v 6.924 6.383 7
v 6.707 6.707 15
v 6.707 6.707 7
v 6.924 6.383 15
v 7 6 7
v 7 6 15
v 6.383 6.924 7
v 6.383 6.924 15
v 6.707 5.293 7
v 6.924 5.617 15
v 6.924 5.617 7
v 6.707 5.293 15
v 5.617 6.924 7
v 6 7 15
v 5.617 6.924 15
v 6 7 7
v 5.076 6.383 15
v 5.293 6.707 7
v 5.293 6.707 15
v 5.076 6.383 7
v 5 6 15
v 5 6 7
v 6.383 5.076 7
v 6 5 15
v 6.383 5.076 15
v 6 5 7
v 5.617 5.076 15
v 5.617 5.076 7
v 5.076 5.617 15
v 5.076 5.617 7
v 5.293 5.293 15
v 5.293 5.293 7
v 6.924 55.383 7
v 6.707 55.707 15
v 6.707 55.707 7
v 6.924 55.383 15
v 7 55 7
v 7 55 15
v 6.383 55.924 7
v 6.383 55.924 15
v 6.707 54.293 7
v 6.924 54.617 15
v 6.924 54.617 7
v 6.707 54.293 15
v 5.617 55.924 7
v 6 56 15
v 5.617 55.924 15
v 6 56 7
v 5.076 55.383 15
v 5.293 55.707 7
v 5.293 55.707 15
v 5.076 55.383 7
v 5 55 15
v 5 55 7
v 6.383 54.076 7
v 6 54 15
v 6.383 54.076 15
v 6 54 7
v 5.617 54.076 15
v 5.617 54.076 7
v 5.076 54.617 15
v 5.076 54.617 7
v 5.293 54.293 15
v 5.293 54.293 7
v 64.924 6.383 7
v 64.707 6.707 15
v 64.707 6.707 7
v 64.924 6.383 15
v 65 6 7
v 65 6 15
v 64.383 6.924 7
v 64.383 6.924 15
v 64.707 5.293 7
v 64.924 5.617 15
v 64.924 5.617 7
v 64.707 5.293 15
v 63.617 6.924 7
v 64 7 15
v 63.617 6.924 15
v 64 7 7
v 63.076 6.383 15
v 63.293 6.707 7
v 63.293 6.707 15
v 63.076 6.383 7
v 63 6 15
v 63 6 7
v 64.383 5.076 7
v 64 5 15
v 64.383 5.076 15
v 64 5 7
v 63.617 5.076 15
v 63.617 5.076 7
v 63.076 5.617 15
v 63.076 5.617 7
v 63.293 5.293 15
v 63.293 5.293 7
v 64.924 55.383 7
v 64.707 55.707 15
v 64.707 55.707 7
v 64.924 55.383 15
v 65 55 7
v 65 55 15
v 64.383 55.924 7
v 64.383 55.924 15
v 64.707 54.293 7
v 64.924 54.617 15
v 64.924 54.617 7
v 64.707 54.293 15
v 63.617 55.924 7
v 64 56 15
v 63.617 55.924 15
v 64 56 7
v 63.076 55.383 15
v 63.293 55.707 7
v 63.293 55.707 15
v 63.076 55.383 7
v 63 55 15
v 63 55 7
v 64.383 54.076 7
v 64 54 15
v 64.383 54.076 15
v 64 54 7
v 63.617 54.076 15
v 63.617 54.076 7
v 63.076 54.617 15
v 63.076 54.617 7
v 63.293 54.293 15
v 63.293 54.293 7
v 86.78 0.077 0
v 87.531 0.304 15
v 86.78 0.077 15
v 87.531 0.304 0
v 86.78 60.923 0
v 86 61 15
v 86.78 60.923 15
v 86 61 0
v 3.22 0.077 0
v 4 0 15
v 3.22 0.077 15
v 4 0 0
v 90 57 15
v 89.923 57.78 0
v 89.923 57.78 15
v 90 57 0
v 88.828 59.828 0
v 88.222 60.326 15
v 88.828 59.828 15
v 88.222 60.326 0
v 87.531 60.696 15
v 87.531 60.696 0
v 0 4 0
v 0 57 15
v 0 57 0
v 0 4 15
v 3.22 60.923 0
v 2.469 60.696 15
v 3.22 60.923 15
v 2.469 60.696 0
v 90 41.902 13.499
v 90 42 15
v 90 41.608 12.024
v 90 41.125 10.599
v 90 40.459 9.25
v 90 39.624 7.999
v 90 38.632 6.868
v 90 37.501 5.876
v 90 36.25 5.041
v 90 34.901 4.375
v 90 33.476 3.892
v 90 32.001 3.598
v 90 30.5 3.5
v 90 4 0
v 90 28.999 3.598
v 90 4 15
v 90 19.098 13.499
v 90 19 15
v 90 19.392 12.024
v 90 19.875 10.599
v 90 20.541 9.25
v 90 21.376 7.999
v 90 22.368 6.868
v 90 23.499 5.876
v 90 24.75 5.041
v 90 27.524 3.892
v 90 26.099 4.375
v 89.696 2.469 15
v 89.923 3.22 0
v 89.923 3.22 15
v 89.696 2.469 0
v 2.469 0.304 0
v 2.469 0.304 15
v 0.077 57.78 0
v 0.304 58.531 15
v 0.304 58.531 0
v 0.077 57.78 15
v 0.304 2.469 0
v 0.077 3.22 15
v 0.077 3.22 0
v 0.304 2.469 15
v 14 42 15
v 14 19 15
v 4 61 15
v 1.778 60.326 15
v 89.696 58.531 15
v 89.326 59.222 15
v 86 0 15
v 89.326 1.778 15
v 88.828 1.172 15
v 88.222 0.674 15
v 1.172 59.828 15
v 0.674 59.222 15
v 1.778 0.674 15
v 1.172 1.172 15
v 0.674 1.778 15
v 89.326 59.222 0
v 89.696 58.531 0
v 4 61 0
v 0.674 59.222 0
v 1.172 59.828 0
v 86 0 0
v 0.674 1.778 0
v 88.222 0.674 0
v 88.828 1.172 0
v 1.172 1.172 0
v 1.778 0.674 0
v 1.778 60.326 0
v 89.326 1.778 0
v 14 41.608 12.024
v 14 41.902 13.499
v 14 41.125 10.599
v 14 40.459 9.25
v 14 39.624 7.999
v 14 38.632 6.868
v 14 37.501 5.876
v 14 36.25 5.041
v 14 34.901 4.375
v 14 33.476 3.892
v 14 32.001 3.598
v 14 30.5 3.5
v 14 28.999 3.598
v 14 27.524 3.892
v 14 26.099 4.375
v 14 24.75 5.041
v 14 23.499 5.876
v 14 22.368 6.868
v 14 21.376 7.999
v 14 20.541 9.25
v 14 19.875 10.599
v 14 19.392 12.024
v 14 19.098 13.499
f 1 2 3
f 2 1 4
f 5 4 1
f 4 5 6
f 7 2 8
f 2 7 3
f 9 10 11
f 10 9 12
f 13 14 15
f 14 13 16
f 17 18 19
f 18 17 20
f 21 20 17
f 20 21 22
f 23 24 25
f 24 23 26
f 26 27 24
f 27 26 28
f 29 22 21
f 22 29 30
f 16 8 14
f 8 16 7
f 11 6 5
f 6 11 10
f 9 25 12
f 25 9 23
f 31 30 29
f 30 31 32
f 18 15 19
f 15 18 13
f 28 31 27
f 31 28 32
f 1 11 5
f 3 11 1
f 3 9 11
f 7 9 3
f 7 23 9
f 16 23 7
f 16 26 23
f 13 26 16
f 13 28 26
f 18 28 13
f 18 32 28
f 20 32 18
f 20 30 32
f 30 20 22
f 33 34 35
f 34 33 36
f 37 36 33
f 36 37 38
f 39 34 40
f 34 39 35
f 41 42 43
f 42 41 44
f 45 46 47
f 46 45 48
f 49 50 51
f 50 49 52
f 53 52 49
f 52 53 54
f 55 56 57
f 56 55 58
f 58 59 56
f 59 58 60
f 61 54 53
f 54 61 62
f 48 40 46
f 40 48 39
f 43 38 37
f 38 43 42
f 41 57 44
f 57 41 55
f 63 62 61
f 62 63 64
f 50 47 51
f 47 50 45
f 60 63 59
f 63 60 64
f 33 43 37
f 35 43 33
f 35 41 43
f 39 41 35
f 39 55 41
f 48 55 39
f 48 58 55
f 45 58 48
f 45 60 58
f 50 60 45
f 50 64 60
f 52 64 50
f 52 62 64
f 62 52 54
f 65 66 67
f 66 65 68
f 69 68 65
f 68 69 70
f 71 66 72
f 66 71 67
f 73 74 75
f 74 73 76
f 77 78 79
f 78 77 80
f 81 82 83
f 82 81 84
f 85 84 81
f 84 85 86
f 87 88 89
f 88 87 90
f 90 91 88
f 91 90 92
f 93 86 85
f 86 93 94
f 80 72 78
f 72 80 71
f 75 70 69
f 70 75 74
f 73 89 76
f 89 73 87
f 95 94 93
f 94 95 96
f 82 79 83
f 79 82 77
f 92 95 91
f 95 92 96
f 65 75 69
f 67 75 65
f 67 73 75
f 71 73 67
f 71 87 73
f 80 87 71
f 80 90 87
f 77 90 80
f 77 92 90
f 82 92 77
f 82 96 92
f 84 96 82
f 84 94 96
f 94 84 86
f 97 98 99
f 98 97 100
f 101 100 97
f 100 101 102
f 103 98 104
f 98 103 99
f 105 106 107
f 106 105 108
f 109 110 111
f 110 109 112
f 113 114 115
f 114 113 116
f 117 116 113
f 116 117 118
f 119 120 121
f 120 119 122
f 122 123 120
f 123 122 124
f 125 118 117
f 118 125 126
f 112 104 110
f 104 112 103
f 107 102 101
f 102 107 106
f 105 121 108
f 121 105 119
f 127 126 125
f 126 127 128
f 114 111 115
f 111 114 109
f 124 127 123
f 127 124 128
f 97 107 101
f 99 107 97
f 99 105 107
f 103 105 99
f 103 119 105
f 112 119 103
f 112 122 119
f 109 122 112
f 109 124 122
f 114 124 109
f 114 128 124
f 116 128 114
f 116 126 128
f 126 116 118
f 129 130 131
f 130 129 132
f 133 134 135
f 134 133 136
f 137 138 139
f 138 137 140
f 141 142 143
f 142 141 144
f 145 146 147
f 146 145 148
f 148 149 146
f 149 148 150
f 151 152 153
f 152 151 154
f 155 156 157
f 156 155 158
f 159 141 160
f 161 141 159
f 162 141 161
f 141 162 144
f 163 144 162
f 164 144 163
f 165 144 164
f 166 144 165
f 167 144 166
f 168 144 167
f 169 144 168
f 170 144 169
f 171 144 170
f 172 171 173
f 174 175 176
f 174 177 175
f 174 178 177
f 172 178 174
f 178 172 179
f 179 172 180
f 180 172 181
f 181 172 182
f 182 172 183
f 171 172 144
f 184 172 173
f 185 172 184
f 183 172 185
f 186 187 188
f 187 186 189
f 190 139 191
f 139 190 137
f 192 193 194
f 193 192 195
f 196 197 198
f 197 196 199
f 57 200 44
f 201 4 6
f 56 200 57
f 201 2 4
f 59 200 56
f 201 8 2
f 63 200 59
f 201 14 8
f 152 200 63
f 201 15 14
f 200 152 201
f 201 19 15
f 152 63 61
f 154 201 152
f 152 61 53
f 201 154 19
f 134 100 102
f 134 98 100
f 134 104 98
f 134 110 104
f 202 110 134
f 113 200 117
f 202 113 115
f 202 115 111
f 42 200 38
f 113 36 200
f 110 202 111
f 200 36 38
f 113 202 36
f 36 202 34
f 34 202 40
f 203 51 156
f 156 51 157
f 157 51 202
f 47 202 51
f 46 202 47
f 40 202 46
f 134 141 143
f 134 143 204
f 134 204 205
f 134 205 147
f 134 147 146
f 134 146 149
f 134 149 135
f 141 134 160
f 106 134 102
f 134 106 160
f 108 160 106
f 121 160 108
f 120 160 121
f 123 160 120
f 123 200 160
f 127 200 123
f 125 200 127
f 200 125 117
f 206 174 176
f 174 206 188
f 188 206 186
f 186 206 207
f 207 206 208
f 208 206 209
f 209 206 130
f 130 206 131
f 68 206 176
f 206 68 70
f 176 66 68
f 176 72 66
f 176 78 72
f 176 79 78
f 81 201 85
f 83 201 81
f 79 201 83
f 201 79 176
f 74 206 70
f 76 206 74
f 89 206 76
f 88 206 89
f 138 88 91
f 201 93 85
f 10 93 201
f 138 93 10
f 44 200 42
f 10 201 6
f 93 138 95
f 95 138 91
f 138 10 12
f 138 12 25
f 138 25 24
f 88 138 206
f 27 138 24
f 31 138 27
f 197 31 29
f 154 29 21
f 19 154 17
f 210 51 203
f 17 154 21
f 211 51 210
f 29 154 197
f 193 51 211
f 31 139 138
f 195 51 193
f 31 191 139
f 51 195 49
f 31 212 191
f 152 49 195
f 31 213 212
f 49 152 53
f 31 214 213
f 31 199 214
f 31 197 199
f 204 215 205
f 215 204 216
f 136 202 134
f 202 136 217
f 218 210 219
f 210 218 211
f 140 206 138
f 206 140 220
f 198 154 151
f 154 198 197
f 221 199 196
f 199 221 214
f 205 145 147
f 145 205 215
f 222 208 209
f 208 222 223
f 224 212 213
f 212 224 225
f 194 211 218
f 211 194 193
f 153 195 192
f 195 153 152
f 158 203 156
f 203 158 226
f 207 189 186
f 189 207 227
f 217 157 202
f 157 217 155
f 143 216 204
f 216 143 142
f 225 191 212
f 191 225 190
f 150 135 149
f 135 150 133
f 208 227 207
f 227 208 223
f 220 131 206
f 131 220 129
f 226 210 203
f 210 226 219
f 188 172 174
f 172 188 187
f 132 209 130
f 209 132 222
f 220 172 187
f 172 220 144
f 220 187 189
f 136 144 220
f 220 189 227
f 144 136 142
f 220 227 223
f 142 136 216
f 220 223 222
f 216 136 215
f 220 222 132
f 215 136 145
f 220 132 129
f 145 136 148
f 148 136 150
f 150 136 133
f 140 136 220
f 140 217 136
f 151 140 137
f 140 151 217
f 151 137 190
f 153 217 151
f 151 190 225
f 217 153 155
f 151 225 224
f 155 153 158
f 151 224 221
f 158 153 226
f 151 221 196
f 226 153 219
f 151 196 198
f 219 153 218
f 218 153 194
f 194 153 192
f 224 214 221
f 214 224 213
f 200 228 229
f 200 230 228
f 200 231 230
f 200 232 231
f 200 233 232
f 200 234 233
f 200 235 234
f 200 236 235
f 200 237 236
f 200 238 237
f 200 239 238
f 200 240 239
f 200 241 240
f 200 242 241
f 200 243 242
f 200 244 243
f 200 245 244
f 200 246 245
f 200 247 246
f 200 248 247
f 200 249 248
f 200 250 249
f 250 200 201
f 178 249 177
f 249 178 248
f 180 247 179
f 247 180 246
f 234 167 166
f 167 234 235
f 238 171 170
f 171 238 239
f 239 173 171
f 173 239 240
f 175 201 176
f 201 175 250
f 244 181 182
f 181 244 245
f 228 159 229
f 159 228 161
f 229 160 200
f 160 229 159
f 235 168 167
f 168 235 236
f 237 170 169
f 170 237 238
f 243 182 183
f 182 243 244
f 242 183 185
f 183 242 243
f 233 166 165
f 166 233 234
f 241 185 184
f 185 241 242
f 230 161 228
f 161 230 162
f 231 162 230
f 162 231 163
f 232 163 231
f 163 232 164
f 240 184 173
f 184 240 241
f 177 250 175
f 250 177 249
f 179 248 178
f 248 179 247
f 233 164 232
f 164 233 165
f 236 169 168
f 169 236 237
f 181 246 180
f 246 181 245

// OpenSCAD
// Pi 5 + Waveshare UPS HAT (D) + Waveshare 3.5" RPi LCD (A) stack enclosure
//
// Design: open-frame stack, not a fully closed box. A solid base tray holds
// the 21700 battery in an open-top channel and gives the UPS HAT its 4
// mounting bosses. Pi5 and the LCD then stack above on printed spacer tubes,
// all captured by 4 long M2.5 screws running from the base up through every
// board's mounting holes. Sides are left open on purpose: exact port cutout
// positions for these boards weren't available, so rather than guess and
// risk misaligned holes, every edge stays accessible on every tier.
//
// ASSUMPTIONS TO VERIFY BEFORE FULL ASSEMBLY (dry-fit the base + one spacer
// first):
//   - UPS_TO_PI_GAP (8.5mm): pogo-pin engagement height, not confirmed from
//     a datasheet drawing. GPIO_HEADER_GAP (8.5mm) is the real, documented
//     standard female-header height, so that one's solid.
//   - Battery channel is sized from the 21700 cell (21mm dia x 70mm) with
//     ~1mm radial clearance. Waveshare's own battery holder geometry wasn't
//     available, so this assumes the bare cell sits directly in the channel.

// ---- Standard Raspberry Pi / HAT board spec (confirmed) ----
BOARD_L   = 85;
BOARD_W   = 56;
HOLE_DX   = 58;    // hole spacing along length
HOLE_DY   = 49;    // hole spacing along width
HOLE_OFF  = 3.5;   // hole offset from board edge

// ---- Stack gaps ----
UPS_TO_PI_GAP   = 8.5;  // ASSUMPTION - verify against real pogo-pin height
GPIO_HEADER_GAP = 8.5;  // confirmed standard GPIO female header height

// ---- Hardware ----
SCREW_CLEARANCE_D = 2.8;  // M2.5 shaft clearance
PILOT_D            = 2.0; // self-tap pilot hole diameter in base
PILOT_DEPTH         = 8;
POST_OD             = 6;

// ---- Base tray ----
MARGIN     = 2.5;                  // plate margin around board footprint
PLATE_L    = BOARD_L + 2*MARGIN;   // 90
PLATE_W    = BOARD_W + 2*MARGIN;   // 61
PLATE_T    = 15;
CORNER_R   = 4;

BATTERY_D      = 21;
BATTERY_CLR    = 1;                     // radial clearance
CHANNEL_R      = BATTERY_D/2 + BATTERY_CLR;  // 11.5
CHANNEL_LEN    = 76;                    // battery is 70mm; open end for insertion

module rounded_plate(l, w, t, r) {
    hull() {
        for (x = [r, l-r], y = [r, w-r])
            translate([x, y, 0]) cylinder(h=t, r=r, $fn=32);
    }
}

function hole_positions() = [
    for (x = [MARGIN+HOLE_OFF, MARGIN+HOLE_OFF+HOLE_DX])
    for (y = [MARGIN+HOLE_OFF, MARGIN+HOLE_OFF+HOLE_DY])
    [x, y]
];

module base_tray() {
    difference() {
        rounded_plate(PLATE_L, PLATE_W, PLATE_T, CORNER_R);

        // battery channel, open at the +X edge for insertion/removal
        translate([PLATE_L - CHANNEL_LEN, PLATE_W/2, PLATE_T])
            rotate([0, 90, 0])
            cylinder(h=CHANNEL_LEN + 1, r=CHANNEL_R, $fn=48);

        // pilot holes for the 4 long screws
        for (p = hole_positions())
            translate([p[0], p[1], PLATE_T - PILOT_DEPTH])
                cylinder(h=PILOT_DEPTH + 1, d=PILOT_D, $fn=16);
    }
}

module spacer_tube(height) {
    difference() {
        cylinder(h=height, d=POST_OD, $fn=32);
        translate([0, 0, -1])
            cylinder(h=height + 2, d=SCREW_CLEARANCE_D, $fn=16);
    }
}

// ---- Layout for viewing / printing ----
part = "base"; // "base" | "spacer_ups_pi" | "spacer_pi_lcd" | "all"

if (part == "base" || part == "all")
    base_tray();

if (part == "spacer_ups_pi" || part == "all")
    translate([PLATE_L + 15, 0, 0])
        spacer_tube(UPS_TO_PI_GAP);

if (part == "spacer_pi_lcd" || part == "all")
    translate([PLATE_L + 30, 0, 0])
        spacer_tube(GPIO_HEADER_GAP);
